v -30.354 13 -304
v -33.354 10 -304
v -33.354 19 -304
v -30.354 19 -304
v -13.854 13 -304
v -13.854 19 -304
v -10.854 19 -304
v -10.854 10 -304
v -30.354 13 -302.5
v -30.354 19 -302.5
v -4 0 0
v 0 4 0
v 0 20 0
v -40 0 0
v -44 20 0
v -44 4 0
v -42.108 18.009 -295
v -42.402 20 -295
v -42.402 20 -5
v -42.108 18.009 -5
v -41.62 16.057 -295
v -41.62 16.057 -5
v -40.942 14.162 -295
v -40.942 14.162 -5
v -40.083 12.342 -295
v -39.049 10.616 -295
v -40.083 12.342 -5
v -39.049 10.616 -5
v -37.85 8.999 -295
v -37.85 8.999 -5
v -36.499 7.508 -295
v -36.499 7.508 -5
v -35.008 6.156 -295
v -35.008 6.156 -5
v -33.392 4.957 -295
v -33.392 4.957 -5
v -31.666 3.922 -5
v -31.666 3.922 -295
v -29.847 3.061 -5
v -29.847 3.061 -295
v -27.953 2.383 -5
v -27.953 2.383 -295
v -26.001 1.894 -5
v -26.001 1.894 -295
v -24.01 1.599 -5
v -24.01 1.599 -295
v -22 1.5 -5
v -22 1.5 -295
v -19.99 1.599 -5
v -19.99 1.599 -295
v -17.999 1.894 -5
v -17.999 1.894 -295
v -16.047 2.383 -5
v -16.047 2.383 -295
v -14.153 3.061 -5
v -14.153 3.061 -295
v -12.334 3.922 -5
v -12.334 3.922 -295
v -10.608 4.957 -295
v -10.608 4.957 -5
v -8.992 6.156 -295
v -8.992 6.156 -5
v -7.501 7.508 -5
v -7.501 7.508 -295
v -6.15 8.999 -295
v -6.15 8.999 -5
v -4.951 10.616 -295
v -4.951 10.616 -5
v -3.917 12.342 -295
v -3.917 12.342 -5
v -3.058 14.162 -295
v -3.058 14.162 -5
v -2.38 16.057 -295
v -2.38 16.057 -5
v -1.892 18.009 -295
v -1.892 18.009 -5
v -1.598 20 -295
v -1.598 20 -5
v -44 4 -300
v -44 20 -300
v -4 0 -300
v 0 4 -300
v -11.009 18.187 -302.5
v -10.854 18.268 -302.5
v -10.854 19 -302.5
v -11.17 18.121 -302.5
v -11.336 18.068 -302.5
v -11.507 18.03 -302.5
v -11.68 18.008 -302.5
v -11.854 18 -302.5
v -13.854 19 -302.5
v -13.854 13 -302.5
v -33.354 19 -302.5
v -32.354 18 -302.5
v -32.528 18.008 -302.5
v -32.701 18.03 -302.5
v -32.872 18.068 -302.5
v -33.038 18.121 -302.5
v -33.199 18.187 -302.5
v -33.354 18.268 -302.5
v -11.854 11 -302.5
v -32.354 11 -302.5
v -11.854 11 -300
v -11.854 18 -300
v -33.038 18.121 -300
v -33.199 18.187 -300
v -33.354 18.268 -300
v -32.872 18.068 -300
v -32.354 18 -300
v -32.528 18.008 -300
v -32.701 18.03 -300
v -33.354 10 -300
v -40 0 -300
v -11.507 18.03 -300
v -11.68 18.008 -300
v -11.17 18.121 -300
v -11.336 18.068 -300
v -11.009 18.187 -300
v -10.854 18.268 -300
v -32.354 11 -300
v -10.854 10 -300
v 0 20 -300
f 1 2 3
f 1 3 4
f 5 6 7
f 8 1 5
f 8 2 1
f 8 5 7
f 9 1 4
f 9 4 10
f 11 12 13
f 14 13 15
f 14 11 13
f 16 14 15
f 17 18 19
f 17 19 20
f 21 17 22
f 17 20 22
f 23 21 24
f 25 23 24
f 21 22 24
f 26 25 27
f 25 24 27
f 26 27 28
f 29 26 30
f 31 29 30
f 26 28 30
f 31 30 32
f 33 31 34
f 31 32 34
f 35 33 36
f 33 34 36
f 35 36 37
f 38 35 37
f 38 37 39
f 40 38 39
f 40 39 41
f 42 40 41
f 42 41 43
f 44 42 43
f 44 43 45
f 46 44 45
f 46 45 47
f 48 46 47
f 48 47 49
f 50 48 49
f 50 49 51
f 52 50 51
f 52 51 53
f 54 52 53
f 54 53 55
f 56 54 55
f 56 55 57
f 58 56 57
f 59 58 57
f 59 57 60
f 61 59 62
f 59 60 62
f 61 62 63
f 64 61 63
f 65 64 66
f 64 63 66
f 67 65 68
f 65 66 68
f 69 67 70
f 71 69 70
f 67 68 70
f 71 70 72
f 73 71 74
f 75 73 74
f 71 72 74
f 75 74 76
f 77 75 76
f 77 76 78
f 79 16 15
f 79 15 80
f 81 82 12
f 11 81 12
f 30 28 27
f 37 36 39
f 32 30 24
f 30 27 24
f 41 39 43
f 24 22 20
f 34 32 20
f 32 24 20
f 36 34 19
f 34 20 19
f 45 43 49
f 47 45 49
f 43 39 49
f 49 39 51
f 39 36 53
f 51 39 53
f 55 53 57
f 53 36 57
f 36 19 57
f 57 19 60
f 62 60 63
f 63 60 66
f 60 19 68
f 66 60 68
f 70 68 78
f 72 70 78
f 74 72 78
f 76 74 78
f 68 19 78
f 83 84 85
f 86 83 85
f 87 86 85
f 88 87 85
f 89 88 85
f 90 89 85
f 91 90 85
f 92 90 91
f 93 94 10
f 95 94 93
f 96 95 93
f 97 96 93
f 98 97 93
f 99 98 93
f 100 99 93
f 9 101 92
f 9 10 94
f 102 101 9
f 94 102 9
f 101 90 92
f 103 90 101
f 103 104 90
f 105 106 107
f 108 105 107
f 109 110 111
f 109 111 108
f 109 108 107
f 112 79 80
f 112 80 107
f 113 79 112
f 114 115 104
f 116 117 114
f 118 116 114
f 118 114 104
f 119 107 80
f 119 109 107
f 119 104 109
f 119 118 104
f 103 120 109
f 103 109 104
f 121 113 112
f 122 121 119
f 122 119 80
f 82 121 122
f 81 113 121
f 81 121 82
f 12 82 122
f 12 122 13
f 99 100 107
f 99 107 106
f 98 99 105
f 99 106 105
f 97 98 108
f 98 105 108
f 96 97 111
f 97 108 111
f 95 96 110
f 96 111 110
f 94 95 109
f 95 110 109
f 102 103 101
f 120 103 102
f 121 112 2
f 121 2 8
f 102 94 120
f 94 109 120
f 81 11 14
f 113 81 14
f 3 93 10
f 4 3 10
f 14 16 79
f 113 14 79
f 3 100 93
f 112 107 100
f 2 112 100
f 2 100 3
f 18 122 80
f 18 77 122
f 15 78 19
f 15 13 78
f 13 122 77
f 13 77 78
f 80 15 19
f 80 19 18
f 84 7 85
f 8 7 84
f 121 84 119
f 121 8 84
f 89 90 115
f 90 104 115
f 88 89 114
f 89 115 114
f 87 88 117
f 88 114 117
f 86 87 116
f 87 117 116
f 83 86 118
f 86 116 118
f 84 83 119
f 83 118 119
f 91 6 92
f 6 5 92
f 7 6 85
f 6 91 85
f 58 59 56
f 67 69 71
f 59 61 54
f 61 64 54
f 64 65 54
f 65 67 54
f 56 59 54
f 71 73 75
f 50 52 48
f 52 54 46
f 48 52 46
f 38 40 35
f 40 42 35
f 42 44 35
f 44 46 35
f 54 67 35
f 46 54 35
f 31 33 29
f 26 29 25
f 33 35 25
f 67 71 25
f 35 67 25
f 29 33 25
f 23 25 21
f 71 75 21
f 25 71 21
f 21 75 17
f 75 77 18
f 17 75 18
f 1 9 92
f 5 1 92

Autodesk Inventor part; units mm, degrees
ref_plane "YZ Plane" through (0, 0, 0) normal (1, 0, 0) x (0, 1, 0)
ref_plane "XZ Plane" through (0, 0, 0) normal (0, 1, 0) x (-1, 0, 0)
ref_plane "XY Plane" through (0, 0, 0) normal (0, 0, 1) x (1, 0, 0)
sketch "Sketch1" plane through (0, 0, 0) normal (0, 1, 0) x (-1, 0, 0)
  line L0 (0, 0) -> (44, 0)
  line L1 (44, 0) -> (44, -300)
  line L2 (44, -300) -> (0, -300)
  line L3 (0, -300) -> (0, 0)
  dimension "d0" = 300
  dimension "d1" = 44
extrude "Extrusion1" add sketch "Sketch1" along normal blind 20
sketch "Sketch2" plane through (-44, 0, 0) normal (0, 0, 1) x (1, 0, 0)
  line L0 (44, 20) -> (0, 20) projected
  line L1 (44, 0) -> (0, 0) projected
  line L2 (0, 0) -> (44, 0)
  line L3 (44, 0) -> (44, 22)
  line L4 (44, 22) -> (0, 22)
  line L5 (0, 22) -> (0, 0)
  circle A0 centre (22, 22) radius 20.5
  dimension "d17" = 22
  dimension "d18" = 41
  dimension "d19" = 22
extrude "Extrusion2" cut sketch "Sketch2" against normal up to surface (300 mm away) contours A0 L0 | L0 A0 L4 | L4 A0
sketch "Sketch3" plane through (-44, 0, 0) normal (0, 0, 1) x (1, 0, 0)
  line L0 (0, 0) -> (0, 20) projected
  line L1 (0, 20) -> (44, 20)
  line L2 (44, 20) -> (44, 0)
  line L3 (44, 0) -> (0, 0)
  line L4 (0, 0) -> (0, 20)
extrude "Extrusion3" add sketch "Sketch3" against normal blind 5
sketch "Sketch4" plane through (0, 0, -300) normal (0, 0, -1) x (-1, 0, 0)
  line L0 (0, 0) -> (0, 20) projected
  line L1 (44, 0) -> (0, 0) projected
  line L2 (0, 20) -> (44, 20)
  line L3 (44, 20) -> (44, 0)
  line L4 (44, 0) -> (0, 0)
  line L5 (0, 0) -> (0, 20)
extrude "Extrusion4" add sketch "Sketch4" against normal blind 5
chamfer "Chamfer1" distance 4 angle 45 1 edges at (0, 0, -150)
chamfer "Chamfer2" distance 4 angle 45 1 edges at (-44, 0, -150)
sketch "Sketch5" plane through (0, 20, -300) normal (0, 0, -1) x (-1, 0, 0)
  line L0 (0, 0) -> (44, 0)
  line L1 (44, 0) -> (44, -20)
  line L2 (44, -20) -> (0, -20)
  line L3 (0, -20) -> (0, 0)
  line L4 (44, -16) -> (40, -20) projected
  line L5 (4, -20) -> (0, -16) projected
  line L6 (22, 0) -> (22, -20)
  line L7 (0, -10) -> (44, -10)
  line L8 (11.8539, 0) -> (11.8539, -20)
  line L9 (32.3539, 0) -> (32.3539, -20)
  line L10 (10.8539, 0) -> (10.8539, -20)
  line L11 (33.3539, 0) -> (33.3539, -20)
  line L12 (0, -9) -> (44, -9)
  circle A0 centre (11.8539, 0) radius 2
  circle A1 centre (32.3539, 0) radius 2
  point P0 (0, -20)
  point P1 (2, -18)
  point P2 (42, -18)
  point P3 (11.8539, -2)
  point P4 (10.8539, -1.7321)
  point P5 (10.8539, -10)
  point P6 (33.3539, -10)
  point P7 (33.3539, -1.7321)
  point P8 (32.3539, -2)
  point P9 (32.3539, -9)
  point P10 (11.8539, -9)
  dimension "d20" = 20
  dimension "d21" = 44
  dimension "d23" = 2
  dimension "d24" = 2
  dimension "d25" = 20.5
  dimension "d26" = 11.8539
  dimension "d27" = 1
  dimension "d28" = 1
  dimension "d29" = 9
  dimension "d30" = 4
  dimension "d31" = 4
extrude "Extrusion5" add sketch "Sketch5" along normal blind 2.5 contours A0 L8 L12 L10 | L12 L8 L7 L10 | L12 L6 L7 L8 | L12 L9 L7 L6 | A1 L11 L12 L9 | L12 L11 L7 L9
sketch "Sketch7" plane through (-33.3539, 10, -300) normal (0, -1, 0) x (1, 0, 0)
  line L0 (22.5, -2.5) -> (0, -2.5)
  line L1 (0, -2.5) -> (0, -4)
  line L2 (0, -4) -> (22.5, -4)
  line L3 (22.5, -4) -> (22.5, -2.5)
  line L4 (0, 0) -> (0, -2.5) projected
  line L5 (22.5, -4) -> (21.5, -4)
  line L6 (21.5, -2.5) -> (22.5, -2.5)
  line L7 (22.5, -2.5) -> (22.5, -4)
  line L8 (21.5, 0) -> (21.5, -2.5) projected
  line L9 (3, -2.5) -> (0, -2.5)
  line L10 (0, -2.5) -> (0, -4)
  line L11 (0, -4) -> (3, -4)
  line L12 (3, -4) -> (3, -2.5)
  line L13 (22.5, -2.5) -> (0, -2.5) projected
  line L14 (22.5, -4) -> (19.5, -4)
  line L15 (19.5, -4) -> (19.5, -2.5)
  line L16 (19.5, -2.5) -> (22.5, -2.5)
  line L17 (22.5, -2.5) -> (22.5, -4)
  point P0 (33.3539, 300)
  point P1 (22.5, -3.25)
  point P2 (19.5, -4)
  point P3 (19.5, -2.5)
  point P4 (3, -4)
  dimension "d36" = 1.5
  dimension "d37" = 3
  dimension "d38" = 3
extrude "Extrusion6" add sketch "Sketch7" against normal blind 3 contours L15 L2 L12 L0
extrude "Extrusion7" add sketch "Sketch7" against normal blind 9 contours L3 L2 L15 L0 | L12 L2 L1 L0
properties part number "profilrampa"
